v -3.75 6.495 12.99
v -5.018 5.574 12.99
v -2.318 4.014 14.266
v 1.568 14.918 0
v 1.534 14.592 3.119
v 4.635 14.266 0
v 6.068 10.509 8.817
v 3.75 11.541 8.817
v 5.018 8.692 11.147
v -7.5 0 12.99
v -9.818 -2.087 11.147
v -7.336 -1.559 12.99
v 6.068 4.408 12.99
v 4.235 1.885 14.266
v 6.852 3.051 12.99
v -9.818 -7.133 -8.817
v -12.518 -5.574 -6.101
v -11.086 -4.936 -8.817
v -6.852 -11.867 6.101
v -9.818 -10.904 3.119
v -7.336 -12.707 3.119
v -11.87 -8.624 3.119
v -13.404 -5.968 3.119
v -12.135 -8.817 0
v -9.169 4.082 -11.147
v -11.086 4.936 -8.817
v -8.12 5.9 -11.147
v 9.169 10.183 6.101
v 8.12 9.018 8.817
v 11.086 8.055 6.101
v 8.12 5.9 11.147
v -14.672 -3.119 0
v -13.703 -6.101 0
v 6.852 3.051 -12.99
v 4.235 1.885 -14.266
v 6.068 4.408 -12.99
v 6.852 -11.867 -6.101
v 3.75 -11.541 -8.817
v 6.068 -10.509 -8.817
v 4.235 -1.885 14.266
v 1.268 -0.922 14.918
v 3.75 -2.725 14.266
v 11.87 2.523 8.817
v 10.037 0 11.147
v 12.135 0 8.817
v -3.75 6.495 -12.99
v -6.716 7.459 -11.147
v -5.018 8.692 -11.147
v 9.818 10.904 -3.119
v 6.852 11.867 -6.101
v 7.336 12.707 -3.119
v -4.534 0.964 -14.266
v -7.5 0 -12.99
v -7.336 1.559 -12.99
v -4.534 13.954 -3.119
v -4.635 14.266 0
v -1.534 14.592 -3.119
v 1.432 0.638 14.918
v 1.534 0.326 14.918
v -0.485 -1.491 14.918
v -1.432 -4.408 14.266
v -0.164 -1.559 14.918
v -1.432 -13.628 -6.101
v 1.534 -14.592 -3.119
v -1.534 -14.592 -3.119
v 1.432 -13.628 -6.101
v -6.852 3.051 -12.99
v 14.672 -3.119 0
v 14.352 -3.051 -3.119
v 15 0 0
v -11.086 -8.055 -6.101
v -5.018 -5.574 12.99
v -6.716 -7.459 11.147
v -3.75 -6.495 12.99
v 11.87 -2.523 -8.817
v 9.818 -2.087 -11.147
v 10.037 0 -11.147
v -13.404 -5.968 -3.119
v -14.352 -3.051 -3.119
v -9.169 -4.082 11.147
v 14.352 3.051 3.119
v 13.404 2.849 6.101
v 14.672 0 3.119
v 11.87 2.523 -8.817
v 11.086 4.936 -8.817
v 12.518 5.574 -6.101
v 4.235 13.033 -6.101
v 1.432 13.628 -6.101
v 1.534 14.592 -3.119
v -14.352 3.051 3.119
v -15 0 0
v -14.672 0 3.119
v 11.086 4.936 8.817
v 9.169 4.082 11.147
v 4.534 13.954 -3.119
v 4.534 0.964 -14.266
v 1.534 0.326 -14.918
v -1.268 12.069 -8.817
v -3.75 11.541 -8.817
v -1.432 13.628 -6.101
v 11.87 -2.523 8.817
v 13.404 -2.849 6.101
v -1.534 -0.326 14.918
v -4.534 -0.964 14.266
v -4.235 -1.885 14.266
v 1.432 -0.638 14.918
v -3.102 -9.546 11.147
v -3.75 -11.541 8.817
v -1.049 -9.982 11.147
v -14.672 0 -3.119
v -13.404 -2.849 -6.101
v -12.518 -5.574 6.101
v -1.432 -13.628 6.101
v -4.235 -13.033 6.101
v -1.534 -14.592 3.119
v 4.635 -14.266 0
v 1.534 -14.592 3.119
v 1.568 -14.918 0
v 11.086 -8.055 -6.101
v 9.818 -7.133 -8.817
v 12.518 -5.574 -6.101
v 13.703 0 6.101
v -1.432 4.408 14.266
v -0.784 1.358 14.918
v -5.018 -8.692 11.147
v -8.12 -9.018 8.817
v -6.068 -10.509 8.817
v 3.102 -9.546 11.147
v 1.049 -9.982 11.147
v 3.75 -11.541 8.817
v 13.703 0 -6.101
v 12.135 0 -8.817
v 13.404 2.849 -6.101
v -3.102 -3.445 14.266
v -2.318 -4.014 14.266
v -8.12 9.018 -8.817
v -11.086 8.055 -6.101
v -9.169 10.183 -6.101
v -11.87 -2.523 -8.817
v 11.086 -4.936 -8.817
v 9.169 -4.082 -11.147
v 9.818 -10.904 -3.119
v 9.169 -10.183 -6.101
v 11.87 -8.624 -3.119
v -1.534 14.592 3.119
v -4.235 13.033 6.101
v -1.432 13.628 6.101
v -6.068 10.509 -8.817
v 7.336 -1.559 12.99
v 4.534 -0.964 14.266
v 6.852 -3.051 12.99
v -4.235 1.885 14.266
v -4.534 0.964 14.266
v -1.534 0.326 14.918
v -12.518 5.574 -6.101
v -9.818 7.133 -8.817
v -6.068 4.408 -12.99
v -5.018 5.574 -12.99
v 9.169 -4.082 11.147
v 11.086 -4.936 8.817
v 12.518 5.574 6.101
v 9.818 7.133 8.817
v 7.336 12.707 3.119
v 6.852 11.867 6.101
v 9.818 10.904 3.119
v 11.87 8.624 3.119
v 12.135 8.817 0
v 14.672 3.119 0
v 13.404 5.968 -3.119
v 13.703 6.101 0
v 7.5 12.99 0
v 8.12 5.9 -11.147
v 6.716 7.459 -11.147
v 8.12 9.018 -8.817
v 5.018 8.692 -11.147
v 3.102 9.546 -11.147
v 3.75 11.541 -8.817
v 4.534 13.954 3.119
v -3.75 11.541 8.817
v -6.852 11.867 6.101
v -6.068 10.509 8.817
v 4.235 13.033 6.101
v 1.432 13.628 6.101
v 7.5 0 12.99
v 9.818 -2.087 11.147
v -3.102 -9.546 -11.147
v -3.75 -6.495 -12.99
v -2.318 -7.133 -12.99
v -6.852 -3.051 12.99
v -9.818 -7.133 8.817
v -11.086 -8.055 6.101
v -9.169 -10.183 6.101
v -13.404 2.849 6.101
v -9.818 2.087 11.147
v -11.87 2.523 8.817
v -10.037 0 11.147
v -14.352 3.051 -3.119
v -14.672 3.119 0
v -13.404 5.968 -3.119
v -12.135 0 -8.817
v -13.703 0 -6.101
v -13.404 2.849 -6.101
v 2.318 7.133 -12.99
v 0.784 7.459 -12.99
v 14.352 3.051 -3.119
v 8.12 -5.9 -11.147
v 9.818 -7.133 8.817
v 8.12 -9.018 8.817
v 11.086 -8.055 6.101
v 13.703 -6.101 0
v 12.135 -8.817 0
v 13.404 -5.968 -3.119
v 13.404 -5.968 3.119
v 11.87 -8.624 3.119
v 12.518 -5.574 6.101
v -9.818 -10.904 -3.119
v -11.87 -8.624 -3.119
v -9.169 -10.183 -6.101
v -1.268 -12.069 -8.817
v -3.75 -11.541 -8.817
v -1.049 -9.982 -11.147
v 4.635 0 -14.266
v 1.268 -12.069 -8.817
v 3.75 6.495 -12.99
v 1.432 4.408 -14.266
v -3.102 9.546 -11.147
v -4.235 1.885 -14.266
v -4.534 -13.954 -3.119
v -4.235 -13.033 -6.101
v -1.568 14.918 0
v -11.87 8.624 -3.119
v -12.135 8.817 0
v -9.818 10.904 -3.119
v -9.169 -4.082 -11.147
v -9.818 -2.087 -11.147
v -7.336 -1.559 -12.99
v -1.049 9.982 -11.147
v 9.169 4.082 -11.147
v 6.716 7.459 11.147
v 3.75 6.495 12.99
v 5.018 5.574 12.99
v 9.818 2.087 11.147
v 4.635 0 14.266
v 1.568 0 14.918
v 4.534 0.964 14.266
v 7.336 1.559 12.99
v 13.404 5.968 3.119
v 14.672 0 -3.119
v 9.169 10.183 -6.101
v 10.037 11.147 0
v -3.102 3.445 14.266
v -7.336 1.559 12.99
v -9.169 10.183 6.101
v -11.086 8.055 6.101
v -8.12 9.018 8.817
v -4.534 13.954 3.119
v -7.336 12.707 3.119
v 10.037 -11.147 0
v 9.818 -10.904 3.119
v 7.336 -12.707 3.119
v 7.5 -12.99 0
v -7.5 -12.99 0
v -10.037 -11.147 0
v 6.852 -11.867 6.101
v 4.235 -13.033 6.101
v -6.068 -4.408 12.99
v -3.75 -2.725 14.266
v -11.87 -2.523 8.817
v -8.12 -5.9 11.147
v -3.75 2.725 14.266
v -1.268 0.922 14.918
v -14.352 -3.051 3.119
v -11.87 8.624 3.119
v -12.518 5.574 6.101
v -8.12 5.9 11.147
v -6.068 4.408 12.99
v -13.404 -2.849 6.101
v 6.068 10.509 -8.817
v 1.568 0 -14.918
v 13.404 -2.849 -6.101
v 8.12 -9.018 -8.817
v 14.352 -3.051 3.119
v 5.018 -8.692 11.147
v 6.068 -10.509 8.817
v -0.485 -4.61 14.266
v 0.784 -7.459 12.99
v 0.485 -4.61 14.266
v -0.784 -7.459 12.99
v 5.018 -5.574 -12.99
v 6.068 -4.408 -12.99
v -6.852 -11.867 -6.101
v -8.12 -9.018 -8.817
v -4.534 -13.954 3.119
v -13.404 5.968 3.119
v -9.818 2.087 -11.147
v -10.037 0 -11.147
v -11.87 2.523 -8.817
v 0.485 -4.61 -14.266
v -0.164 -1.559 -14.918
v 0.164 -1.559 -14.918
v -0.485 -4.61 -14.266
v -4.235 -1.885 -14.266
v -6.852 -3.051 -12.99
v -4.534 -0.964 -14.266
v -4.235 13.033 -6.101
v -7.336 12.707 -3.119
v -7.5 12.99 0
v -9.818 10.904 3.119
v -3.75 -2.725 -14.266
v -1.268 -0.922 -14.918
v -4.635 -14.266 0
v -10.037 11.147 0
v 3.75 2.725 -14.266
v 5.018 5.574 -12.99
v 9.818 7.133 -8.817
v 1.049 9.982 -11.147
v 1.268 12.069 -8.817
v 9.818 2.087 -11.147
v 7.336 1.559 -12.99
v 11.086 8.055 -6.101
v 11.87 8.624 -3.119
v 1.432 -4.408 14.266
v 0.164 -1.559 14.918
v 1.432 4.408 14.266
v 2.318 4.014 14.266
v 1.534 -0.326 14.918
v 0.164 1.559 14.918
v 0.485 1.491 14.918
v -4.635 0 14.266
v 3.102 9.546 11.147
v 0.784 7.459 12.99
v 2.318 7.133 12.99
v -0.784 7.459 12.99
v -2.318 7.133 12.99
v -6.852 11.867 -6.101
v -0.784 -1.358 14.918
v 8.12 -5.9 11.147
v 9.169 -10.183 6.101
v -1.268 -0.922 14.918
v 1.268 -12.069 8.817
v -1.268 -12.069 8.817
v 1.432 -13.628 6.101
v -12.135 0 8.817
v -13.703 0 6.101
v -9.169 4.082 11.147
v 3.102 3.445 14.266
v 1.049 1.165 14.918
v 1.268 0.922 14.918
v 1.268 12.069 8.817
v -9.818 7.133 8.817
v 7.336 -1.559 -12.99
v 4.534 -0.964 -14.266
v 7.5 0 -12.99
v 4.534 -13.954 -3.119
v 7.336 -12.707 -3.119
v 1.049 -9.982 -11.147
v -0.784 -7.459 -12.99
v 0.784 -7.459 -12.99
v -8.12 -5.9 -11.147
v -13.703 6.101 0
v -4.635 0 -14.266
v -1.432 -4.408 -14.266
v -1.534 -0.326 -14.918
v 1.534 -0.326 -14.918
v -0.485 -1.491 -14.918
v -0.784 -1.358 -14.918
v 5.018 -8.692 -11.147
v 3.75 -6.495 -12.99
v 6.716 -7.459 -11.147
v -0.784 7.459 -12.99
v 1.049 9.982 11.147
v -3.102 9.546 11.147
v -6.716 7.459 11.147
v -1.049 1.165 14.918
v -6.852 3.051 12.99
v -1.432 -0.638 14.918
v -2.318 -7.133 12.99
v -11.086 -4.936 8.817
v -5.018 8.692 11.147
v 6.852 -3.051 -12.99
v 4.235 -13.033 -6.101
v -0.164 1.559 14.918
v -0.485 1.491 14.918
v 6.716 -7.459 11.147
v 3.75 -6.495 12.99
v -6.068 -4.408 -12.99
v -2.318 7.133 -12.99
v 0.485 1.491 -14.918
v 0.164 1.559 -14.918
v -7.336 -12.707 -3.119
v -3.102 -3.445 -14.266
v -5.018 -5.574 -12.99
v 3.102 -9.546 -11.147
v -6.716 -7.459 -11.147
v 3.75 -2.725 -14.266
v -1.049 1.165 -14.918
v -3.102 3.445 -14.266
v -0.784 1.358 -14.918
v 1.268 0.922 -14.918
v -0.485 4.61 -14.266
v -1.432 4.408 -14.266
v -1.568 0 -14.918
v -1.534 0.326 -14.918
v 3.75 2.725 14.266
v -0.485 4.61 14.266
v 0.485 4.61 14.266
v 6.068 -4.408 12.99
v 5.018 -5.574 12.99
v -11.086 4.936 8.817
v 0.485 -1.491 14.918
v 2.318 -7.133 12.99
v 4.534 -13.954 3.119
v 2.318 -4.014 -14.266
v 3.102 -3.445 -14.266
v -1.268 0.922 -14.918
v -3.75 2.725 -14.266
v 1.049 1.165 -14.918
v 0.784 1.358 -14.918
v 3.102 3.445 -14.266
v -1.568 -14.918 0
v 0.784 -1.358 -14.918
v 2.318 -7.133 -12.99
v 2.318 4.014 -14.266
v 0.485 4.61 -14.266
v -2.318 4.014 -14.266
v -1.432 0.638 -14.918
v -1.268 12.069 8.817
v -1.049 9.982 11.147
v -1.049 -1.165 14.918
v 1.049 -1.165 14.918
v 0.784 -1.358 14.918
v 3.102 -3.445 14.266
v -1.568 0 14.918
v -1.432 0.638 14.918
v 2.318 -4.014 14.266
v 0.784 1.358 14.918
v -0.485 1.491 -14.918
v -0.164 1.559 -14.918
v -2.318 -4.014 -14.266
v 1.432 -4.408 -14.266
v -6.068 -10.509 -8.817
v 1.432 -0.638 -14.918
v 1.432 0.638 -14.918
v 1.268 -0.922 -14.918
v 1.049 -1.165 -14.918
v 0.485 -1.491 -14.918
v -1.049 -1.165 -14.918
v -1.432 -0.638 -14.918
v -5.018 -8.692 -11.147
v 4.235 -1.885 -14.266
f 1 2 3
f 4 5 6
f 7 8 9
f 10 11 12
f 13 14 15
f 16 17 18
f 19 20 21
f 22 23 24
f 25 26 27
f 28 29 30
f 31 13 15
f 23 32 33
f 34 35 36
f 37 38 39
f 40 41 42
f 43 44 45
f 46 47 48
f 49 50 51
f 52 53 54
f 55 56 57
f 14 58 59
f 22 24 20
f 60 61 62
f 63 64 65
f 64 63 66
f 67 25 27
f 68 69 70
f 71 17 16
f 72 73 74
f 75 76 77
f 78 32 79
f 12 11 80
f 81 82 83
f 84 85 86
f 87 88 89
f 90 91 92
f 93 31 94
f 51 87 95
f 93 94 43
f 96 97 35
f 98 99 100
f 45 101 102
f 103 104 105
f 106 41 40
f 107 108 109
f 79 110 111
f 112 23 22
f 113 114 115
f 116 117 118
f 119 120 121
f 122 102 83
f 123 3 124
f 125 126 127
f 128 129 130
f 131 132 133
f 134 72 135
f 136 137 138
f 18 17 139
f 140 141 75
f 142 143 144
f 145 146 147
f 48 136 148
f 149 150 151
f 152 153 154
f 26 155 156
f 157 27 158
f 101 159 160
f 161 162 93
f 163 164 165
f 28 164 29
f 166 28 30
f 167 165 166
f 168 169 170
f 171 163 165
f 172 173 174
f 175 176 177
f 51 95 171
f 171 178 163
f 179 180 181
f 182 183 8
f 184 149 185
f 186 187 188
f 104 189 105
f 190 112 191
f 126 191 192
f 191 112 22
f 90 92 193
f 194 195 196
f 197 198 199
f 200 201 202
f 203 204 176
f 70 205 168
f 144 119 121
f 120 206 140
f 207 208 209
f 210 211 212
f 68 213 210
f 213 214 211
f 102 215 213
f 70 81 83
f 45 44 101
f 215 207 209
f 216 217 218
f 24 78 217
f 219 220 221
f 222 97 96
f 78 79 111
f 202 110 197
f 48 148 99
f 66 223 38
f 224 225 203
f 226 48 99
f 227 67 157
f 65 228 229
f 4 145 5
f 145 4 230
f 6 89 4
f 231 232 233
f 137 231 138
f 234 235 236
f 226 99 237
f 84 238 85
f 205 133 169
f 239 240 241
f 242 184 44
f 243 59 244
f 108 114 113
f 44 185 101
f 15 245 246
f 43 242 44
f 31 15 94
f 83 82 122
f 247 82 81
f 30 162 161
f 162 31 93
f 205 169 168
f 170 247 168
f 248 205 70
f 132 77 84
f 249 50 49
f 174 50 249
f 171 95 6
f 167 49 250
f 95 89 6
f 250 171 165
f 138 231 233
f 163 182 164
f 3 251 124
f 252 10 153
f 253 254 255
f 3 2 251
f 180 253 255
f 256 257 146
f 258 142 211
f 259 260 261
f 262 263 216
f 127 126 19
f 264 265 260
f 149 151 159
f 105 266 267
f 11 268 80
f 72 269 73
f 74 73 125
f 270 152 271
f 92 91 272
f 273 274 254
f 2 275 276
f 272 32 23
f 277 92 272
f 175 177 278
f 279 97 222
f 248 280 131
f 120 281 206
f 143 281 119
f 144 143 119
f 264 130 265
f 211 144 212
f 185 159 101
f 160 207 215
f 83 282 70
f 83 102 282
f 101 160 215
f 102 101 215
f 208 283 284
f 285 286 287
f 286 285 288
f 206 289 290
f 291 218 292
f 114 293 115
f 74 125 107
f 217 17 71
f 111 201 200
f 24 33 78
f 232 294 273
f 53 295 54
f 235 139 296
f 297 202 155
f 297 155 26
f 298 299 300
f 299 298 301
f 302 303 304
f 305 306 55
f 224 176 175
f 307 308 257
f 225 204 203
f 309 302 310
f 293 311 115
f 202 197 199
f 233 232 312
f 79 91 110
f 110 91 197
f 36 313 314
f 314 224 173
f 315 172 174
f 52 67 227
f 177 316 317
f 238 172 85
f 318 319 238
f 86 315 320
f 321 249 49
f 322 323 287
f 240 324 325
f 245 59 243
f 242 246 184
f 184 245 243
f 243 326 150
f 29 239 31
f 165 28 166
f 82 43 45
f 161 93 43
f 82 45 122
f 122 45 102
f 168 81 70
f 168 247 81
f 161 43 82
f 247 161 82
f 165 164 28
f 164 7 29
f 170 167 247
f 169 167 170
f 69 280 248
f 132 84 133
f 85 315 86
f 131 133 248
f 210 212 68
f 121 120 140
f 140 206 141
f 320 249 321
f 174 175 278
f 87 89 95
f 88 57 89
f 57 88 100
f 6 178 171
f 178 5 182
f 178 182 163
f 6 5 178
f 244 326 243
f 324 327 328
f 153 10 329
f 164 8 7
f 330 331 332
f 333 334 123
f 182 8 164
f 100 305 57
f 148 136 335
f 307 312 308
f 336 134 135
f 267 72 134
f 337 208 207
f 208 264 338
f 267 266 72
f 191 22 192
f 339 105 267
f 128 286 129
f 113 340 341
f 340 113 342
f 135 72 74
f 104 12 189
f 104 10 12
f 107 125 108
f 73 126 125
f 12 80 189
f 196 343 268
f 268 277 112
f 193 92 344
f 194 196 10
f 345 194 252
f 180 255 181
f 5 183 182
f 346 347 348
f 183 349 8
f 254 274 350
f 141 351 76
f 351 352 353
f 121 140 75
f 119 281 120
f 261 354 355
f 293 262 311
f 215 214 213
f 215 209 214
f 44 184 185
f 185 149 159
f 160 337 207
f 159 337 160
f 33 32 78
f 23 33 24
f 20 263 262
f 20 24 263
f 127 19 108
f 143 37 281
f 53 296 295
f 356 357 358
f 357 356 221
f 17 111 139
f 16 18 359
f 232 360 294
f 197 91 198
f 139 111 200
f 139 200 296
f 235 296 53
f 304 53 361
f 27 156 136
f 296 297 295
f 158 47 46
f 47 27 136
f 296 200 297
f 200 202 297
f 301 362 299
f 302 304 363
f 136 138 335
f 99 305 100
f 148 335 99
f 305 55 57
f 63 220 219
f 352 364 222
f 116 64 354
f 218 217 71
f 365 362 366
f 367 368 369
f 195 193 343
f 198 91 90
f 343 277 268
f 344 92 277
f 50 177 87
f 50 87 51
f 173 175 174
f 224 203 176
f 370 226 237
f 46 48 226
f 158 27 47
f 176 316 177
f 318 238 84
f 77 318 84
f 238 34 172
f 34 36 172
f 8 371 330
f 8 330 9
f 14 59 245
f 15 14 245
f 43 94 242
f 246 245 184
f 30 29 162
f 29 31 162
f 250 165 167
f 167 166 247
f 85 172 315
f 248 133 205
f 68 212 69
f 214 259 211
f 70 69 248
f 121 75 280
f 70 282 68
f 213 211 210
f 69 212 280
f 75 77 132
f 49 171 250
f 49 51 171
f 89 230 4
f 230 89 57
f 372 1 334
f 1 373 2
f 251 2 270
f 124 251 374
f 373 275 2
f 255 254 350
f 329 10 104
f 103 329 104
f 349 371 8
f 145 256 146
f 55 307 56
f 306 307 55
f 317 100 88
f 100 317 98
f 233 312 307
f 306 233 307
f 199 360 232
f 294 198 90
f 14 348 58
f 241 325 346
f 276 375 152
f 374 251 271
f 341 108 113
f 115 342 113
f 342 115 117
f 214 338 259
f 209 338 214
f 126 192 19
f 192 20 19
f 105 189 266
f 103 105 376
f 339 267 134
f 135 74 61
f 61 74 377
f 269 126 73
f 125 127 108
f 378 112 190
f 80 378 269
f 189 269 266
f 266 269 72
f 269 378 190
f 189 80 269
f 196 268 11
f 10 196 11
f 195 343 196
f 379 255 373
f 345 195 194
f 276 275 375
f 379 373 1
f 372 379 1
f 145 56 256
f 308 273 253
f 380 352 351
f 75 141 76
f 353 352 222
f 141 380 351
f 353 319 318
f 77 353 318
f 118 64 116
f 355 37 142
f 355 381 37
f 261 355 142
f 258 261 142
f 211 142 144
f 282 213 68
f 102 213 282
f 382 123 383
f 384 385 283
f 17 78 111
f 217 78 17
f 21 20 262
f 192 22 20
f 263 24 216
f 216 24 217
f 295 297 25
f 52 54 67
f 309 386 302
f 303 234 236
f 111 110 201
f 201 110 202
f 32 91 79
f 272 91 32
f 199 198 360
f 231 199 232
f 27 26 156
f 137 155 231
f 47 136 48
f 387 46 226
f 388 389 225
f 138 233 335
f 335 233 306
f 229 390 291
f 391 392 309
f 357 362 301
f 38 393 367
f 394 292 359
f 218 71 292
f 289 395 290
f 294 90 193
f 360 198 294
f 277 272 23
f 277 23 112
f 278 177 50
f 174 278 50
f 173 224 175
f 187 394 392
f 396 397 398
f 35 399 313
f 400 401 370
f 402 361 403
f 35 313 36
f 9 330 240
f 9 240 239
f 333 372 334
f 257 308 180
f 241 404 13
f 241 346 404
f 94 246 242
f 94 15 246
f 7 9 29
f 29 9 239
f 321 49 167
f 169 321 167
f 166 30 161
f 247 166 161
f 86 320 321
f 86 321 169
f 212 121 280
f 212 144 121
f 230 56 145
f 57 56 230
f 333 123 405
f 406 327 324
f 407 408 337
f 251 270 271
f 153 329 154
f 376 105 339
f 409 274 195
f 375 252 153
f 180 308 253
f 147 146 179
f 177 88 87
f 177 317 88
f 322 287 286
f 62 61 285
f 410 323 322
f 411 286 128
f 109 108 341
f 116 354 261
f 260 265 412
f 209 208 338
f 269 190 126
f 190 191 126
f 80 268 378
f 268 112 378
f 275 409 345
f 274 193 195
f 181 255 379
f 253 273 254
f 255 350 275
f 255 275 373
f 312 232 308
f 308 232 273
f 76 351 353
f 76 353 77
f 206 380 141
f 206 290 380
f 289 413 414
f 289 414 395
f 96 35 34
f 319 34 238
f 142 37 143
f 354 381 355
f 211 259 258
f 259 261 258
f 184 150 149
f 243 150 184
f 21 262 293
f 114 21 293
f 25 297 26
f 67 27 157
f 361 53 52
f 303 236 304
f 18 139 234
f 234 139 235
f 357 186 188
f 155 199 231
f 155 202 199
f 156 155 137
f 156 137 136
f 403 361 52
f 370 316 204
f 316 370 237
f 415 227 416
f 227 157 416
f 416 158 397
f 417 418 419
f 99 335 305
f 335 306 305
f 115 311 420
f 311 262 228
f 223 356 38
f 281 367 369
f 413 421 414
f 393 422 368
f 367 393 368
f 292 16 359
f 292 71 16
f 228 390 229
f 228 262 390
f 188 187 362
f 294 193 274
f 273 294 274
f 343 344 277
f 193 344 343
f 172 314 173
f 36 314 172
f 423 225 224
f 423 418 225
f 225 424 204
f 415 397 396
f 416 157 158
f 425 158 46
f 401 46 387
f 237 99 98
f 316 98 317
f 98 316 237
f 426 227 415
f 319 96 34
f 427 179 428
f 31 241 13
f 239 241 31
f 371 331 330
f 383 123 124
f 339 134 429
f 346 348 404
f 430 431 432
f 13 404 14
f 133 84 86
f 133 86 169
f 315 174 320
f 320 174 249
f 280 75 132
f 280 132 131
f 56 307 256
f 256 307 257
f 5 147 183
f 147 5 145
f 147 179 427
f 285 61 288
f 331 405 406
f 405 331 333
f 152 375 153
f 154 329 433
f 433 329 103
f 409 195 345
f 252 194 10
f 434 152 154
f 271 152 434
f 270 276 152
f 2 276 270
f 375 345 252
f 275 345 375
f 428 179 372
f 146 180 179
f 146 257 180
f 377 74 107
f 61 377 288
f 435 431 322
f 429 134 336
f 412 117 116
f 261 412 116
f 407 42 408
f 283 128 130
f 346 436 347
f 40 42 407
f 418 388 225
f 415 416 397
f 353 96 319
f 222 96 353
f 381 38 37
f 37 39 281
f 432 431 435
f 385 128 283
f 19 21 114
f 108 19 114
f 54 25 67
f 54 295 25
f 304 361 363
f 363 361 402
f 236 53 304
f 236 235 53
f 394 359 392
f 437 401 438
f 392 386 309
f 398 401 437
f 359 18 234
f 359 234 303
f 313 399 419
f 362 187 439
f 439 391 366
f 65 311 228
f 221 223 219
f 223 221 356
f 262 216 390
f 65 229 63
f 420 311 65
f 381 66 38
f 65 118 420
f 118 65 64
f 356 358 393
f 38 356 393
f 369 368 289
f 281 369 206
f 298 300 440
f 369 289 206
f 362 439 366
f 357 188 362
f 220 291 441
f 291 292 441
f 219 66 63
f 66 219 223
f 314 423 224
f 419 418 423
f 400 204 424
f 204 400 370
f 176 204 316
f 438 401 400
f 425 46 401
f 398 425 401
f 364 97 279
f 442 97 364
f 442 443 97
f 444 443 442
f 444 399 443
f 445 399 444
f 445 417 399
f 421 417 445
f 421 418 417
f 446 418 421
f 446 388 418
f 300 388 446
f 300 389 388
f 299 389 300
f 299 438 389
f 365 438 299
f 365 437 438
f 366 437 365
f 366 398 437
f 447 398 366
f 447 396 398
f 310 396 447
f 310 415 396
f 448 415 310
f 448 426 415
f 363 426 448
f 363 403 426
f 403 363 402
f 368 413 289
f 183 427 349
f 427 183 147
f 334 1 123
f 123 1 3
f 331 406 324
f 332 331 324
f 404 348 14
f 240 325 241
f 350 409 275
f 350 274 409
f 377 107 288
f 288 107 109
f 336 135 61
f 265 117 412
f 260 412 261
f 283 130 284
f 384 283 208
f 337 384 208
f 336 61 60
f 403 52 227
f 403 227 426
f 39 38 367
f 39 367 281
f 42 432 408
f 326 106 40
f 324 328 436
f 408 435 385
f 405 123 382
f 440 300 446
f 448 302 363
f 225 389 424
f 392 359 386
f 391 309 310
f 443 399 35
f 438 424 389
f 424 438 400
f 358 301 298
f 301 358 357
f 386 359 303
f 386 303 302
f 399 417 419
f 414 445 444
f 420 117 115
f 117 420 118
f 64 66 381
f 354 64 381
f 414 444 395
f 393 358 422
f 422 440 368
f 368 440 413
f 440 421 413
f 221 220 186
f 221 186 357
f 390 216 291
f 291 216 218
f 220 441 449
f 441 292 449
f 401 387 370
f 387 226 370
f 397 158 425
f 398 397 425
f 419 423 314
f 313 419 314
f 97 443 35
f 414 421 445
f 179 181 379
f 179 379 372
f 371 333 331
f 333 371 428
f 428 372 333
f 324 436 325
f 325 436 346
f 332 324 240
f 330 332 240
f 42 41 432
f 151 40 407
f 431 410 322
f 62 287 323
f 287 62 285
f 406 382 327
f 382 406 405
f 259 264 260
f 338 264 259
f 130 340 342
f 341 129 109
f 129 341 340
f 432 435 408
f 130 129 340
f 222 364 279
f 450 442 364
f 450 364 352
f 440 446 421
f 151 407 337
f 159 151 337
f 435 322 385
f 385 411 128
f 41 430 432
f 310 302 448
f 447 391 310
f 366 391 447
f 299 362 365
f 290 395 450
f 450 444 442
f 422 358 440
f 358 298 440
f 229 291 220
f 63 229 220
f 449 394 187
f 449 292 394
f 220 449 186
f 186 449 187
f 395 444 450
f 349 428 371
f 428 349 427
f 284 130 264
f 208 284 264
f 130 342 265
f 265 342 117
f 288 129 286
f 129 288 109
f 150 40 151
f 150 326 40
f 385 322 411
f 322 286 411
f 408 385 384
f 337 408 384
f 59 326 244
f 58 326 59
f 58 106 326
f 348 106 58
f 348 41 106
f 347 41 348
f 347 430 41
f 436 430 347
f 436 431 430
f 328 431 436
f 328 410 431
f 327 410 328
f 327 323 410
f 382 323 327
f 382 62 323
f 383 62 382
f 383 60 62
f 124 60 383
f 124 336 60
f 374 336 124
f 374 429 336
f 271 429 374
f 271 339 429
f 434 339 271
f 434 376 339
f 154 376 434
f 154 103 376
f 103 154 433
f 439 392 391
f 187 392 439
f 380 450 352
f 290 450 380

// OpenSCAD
// Simple sphere with radius parameter
sphere(10);

// Sphere with named radius parameter
sphere(r=15);

// Sphere with diameter parameter
sphere(d=20);

// Sphere with $fn parameter
sphere(r=10, $fn=100);

// Sphere with $fa and $fs parameters
sphere(r=10, $fa=5, $fs=0.1);

// Sphere with all resolution parameters
sphere(r=10, $fn=100, $fa=5, $fs=0.1);

// Sphere with default radius when no parameters are provided
sphere();

// Sphere with both radius and diameter parameters (diameter should take precedence)
sphere(r=10, d=30);
